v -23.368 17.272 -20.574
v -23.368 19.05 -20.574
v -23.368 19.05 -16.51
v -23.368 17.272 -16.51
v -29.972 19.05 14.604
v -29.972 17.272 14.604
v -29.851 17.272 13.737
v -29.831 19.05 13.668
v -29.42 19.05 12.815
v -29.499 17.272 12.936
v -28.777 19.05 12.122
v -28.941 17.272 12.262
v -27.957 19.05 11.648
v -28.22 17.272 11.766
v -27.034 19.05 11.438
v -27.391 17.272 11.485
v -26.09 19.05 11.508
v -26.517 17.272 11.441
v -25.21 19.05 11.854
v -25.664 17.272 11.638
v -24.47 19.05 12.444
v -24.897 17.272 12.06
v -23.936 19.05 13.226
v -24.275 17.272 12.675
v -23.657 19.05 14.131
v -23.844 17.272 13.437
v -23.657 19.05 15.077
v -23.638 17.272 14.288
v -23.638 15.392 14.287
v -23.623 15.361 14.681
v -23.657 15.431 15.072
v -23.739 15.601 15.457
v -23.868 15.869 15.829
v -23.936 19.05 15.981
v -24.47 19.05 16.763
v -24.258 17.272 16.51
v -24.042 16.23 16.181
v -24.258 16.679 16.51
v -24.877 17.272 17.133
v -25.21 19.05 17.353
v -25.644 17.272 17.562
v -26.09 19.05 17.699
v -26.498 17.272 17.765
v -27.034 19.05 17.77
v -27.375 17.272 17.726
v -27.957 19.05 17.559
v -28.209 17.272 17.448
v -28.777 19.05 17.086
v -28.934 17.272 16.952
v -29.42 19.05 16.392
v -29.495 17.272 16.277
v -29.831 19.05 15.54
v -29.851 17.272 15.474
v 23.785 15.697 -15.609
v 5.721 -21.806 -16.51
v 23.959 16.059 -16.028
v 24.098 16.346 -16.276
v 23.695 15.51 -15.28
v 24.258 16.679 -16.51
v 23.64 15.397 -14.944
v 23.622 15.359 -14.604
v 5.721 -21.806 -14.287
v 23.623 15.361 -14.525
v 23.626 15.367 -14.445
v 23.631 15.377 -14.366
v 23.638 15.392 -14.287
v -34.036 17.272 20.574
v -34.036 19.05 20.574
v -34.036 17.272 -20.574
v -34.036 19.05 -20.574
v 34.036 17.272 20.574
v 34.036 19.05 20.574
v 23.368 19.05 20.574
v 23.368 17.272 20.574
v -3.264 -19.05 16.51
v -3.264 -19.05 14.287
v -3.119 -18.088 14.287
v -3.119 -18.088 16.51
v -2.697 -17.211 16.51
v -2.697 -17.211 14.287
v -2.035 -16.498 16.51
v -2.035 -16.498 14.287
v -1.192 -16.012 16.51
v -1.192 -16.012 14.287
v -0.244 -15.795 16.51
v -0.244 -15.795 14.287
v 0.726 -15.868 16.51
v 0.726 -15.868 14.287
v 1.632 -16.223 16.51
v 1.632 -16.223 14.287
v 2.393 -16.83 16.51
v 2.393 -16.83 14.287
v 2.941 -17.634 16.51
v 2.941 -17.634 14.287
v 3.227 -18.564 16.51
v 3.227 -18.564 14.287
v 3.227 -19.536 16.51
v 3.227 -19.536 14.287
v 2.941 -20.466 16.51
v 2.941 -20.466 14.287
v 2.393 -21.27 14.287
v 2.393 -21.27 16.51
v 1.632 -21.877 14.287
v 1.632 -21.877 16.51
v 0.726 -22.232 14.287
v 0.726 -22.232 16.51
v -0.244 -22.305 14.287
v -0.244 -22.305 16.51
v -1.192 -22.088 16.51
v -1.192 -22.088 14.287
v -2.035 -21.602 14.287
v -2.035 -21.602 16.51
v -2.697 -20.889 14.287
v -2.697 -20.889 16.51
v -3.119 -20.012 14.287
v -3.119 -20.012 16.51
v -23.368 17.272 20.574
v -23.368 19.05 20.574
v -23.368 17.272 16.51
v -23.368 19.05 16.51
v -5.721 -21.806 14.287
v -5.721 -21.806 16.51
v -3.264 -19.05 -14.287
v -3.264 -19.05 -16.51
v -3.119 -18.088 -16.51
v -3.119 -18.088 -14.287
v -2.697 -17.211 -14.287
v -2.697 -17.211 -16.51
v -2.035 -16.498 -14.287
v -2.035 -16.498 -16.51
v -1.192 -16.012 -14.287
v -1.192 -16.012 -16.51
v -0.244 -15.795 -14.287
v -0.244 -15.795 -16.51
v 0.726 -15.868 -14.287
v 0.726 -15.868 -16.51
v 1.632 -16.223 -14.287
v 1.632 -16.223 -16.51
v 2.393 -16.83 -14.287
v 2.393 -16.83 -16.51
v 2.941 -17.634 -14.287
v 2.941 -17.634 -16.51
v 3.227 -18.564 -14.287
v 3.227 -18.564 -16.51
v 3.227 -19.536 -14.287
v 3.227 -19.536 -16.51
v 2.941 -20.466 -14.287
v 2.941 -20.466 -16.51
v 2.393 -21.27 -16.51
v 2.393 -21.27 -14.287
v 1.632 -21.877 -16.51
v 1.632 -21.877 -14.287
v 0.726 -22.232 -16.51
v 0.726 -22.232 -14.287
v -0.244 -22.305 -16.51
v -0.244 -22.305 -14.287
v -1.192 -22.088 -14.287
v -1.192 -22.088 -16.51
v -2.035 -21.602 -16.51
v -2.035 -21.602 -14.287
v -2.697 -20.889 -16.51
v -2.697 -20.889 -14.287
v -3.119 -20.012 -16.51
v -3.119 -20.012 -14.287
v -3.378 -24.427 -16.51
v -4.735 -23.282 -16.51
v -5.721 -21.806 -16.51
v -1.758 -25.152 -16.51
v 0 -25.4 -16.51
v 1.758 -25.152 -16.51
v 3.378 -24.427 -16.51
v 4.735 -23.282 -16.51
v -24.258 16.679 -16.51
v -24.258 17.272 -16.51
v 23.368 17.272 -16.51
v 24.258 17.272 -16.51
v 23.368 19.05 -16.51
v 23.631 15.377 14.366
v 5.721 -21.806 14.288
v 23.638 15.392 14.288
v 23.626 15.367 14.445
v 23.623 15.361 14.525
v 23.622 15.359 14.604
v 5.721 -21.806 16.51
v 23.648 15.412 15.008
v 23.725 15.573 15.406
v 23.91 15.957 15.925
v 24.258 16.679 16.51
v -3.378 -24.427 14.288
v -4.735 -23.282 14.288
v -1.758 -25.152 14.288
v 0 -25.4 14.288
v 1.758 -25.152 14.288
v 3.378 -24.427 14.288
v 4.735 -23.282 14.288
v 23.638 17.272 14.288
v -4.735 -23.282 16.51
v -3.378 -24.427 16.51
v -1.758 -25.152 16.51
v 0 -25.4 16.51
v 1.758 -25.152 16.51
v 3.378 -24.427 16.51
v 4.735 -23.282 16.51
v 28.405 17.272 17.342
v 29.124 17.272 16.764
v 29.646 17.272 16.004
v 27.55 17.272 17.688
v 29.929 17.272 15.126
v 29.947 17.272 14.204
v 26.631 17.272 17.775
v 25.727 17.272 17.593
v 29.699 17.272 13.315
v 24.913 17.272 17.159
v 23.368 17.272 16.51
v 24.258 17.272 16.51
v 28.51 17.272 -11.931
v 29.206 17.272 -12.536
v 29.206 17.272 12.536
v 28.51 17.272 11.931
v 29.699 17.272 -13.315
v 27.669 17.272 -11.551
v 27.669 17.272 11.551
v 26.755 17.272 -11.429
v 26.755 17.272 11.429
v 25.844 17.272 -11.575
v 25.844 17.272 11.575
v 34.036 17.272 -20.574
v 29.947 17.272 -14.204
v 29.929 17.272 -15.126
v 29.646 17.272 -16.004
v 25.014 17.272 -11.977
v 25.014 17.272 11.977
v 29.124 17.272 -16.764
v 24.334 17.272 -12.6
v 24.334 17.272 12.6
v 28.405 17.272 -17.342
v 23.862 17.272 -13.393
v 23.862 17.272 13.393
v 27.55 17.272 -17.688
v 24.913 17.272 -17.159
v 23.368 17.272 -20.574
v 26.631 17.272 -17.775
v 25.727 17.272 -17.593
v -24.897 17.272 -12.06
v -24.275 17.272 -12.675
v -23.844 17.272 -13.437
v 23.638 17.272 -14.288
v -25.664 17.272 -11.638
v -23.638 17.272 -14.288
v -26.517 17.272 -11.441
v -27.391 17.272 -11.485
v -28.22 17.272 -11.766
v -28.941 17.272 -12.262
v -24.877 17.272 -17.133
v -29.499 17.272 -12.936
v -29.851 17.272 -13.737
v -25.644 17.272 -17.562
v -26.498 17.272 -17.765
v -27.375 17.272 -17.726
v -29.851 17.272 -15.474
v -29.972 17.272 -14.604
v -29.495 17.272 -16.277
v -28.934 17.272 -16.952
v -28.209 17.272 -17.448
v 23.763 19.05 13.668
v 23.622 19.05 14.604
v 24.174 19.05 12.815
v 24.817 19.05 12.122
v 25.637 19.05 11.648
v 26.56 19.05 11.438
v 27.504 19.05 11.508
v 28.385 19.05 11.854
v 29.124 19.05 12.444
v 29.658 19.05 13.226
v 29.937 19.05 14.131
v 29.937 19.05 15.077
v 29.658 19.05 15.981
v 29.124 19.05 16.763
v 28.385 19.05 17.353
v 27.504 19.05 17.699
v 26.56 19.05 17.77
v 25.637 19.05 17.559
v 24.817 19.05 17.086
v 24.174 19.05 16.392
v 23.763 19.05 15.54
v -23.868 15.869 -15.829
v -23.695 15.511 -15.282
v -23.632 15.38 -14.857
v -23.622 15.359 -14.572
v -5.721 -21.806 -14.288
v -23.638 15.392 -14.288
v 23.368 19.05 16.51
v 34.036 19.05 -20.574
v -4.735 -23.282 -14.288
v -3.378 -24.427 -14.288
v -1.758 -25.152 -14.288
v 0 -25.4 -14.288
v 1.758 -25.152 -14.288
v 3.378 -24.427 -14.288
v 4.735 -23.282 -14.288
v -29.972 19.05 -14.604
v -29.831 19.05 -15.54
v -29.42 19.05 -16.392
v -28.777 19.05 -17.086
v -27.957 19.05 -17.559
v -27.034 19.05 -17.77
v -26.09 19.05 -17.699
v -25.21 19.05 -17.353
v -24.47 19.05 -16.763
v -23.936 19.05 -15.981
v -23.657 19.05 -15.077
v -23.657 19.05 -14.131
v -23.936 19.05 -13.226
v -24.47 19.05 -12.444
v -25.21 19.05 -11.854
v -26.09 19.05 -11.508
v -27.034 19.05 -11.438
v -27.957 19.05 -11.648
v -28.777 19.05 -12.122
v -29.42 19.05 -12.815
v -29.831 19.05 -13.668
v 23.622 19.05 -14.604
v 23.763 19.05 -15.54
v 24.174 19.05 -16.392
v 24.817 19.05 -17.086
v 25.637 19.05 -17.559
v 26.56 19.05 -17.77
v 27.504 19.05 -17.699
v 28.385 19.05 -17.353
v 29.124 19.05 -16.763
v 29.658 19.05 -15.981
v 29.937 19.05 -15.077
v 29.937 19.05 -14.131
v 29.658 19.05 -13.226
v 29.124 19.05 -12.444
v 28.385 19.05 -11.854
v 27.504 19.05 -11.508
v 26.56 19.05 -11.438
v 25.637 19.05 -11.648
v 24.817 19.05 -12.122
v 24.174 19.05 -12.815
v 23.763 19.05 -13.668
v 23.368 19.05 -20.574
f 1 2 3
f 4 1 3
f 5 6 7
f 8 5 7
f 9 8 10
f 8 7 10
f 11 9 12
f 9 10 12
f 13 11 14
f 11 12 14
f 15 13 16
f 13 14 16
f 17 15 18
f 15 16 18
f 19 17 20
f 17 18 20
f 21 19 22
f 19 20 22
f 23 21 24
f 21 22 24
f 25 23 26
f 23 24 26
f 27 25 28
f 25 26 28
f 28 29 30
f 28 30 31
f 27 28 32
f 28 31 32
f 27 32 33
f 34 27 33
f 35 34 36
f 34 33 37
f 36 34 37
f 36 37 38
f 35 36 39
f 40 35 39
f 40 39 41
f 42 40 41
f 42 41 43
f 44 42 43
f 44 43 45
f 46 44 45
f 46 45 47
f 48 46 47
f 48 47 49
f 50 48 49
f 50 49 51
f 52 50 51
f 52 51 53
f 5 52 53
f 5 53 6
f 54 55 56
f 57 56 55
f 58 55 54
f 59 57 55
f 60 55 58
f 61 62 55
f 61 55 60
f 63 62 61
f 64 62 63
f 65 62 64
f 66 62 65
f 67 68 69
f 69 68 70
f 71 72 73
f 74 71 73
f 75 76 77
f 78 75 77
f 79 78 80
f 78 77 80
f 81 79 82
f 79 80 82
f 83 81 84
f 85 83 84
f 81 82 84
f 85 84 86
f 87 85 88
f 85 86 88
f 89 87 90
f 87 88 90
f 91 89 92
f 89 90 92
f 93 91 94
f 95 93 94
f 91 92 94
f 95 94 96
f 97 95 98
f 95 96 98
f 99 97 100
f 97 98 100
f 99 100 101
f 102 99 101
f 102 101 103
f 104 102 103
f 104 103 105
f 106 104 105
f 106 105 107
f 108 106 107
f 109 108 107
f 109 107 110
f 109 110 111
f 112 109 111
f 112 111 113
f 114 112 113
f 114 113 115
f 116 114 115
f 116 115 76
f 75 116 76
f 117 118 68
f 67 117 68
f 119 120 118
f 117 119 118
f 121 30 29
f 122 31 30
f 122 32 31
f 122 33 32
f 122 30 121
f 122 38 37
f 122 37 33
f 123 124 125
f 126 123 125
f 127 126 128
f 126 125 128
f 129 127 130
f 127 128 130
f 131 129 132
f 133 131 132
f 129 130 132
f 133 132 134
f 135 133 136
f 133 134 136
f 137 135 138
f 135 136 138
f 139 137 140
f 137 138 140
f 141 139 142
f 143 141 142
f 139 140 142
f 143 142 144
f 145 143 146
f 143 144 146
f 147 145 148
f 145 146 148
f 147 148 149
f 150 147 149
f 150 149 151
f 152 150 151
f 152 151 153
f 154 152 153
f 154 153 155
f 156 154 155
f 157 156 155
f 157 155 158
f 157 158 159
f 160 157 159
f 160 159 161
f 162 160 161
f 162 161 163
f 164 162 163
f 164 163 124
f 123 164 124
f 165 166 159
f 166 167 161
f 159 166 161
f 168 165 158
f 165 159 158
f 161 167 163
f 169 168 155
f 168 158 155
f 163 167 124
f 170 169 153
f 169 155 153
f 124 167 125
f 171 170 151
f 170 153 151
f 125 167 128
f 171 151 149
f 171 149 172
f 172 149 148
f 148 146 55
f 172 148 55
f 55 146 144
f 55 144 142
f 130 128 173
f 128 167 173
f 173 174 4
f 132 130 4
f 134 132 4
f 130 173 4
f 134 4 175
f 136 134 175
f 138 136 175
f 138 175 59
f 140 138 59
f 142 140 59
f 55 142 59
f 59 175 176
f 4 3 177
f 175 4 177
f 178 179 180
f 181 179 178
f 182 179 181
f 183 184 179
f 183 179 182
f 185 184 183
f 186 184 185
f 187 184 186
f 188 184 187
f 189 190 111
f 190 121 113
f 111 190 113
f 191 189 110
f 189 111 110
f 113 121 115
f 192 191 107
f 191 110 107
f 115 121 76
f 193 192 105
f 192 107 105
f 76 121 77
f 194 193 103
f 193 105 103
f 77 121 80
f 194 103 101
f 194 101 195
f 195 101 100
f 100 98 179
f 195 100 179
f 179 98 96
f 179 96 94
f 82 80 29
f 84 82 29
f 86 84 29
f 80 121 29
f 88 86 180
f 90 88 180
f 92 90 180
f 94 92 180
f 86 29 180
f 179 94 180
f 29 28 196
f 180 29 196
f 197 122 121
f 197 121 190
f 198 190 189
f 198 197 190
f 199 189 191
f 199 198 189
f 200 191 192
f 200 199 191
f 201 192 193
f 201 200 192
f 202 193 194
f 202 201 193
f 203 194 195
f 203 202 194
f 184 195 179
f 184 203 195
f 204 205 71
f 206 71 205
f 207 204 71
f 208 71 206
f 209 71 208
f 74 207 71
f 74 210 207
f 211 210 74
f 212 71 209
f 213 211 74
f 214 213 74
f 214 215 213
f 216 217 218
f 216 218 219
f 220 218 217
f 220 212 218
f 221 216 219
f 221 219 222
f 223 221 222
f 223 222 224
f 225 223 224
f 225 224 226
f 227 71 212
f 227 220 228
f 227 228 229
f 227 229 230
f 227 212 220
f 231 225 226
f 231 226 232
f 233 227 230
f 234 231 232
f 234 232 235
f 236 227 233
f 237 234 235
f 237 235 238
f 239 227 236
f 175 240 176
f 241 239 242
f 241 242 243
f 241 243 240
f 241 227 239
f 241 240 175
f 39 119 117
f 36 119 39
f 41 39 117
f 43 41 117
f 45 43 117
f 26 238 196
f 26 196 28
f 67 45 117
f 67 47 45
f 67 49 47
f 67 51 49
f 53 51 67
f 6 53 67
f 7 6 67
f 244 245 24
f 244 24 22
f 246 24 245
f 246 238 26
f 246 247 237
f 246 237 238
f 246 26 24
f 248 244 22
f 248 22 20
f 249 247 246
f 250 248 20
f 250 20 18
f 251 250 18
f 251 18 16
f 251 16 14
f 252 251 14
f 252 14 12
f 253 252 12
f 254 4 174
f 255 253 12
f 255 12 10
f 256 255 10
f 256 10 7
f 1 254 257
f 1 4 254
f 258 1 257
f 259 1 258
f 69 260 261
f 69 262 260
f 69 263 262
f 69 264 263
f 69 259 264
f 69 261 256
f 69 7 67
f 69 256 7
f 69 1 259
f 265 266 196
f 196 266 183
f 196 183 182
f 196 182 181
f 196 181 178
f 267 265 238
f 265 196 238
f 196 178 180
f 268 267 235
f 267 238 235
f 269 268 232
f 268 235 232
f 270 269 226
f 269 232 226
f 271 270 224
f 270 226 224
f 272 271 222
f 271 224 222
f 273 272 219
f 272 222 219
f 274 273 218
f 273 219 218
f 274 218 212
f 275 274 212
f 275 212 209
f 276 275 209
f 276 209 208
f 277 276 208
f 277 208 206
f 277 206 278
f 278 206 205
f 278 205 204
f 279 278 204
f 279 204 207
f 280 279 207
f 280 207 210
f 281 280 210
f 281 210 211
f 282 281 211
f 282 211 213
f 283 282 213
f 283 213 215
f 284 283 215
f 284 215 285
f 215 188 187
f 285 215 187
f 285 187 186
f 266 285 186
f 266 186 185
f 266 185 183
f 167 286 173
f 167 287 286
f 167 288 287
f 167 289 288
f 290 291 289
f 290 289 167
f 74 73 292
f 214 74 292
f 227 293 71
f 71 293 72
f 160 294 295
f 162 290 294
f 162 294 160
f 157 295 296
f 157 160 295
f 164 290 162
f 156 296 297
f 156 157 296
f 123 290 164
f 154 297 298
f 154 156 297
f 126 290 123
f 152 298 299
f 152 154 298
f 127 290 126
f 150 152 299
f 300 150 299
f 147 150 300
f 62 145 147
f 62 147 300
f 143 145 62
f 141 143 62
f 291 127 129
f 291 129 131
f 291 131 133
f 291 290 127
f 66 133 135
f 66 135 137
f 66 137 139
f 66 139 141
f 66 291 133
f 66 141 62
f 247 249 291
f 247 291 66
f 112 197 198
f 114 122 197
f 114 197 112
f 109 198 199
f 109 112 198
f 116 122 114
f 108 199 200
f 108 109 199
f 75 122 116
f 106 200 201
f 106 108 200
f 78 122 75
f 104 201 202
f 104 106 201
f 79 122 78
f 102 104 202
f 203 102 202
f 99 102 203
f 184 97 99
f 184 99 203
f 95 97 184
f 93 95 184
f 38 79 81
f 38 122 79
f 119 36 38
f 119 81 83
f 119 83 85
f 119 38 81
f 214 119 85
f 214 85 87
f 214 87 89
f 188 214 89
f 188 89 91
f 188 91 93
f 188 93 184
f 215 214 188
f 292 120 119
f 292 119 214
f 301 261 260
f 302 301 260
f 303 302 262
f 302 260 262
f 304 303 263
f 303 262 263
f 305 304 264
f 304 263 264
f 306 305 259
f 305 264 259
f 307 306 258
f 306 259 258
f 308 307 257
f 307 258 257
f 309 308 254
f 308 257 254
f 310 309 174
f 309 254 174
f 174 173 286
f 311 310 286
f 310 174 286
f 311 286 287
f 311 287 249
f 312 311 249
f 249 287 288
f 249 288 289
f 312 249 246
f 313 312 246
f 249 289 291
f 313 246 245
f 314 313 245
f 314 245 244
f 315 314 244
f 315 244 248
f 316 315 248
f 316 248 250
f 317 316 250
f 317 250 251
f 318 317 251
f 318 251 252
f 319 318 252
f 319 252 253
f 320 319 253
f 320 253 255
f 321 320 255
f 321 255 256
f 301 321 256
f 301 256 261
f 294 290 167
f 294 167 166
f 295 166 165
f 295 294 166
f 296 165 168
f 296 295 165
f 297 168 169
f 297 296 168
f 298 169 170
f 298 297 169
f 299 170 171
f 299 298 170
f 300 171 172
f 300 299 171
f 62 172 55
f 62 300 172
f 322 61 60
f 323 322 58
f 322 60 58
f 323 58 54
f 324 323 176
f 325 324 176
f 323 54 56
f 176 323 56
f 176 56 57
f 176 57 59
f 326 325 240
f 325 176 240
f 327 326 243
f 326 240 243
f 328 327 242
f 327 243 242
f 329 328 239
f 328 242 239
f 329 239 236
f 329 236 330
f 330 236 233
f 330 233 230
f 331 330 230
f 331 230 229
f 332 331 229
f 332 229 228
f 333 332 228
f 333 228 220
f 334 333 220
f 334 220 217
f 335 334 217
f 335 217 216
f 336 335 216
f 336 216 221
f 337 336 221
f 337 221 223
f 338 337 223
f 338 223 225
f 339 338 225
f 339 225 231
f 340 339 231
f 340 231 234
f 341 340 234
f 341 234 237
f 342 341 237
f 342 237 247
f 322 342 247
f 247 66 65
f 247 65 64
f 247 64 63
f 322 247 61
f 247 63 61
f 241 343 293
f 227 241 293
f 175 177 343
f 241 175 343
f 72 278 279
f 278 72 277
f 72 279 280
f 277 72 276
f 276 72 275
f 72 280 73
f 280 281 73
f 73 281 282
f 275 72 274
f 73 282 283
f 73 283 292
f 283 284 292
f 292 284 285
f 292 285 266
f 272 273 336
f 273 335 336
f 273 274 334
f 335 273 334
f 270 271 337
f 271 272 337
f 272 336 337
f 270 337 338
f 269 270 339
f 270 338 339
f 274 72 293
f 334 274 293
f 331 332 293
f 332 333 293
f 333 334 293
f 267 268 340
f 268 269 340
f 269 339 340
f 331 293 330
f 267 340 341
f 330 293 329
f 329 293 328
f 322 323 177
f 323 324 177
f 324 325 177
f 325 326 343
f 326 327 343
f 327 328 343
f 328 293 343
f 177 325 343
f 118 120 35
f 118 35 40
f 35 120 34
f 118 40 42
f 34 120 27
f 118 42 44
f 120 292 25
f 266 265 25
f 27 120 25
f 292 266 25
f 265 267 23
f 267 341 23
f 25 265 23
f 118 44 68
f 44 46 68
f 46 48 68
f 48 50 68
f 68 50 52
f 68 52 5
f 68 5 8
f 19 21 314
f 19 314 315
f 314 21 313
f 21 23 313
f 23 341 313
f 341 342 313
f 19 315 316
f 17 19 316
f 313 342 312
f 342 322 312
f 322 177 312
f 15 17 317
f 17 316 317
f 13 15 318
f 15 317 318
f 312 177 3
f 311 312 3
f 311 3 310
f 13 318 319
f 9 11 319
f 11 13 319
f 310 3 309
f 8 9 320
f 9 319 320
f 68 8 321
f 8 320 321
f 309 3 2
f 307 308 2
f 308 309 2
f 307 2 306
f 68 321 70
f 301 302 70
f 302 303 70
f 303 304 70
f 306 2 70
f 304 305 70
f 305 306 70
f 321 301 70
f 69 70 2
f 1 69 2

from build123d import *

# Parameters (mm, degrees)
BOSS_EXTRUDE1_DEPTH         = 16.51
BOSS_EXTRUDE2_DEPTH         = 1.778
F_1_4_0_25_DIAMETER_HOLE1_D = 6.35
SKETCH6_W                   = 53.975
SKETCH6_H                   = 44.45
CUT_EXTRUDE1_DEPTH          = 14.2875
F_0_257_DIAMETER_HOLE1_D    = 6.5278


with BuildPart() as part:
    # Sketch1 → Boss-Extrude1 (new, symmetric)
    with BuildSketch(Plane.XY):
        with BuildLine():
            Line((25.4, 19.05), (-25.4, 19.05))
            Line((-25.4, 19.05), (-5.720931214, -21.805620809))
            ThreePointArc((-5.720931214, -21.805620809), (0, -25.4), (5.720931214, -21.805620809))
            Line((5.720931214, -21.805620809), (25.4, 19.05))
        make_face()
    extrude(amount=BOSS_EXTRUDE1_DEPTH, both=True)

    # Sketch2 → Boss-Extrude2 (add)
    with BuildSketch(Plane(origin=(0, 19.05, 0), x_dir=(1, 0, 0), z_dir=(0, 1, 0))):
        Polygon((-34.036, -20.574), (-34.036, 20.574), (-23.368, 20.574), (-23.368, 16.51), (23.368, 16.51), (23.368, 20.574), (34.036, 20.574), (34.036, -20.574), (23.368, -20.574), (23.368, -16.51), (-23.368, -16.51), (-23.368, -20.574), align=None)
    extrude(amount=-BOSS_EXTRUDE2_DEPTH)

    # 1/4 (0.25) Diameter Hole1 (through all)
    with Locations(Plane(origin=(0, 19.05, 0), x_dir=(1, 0, 0), z_dir=(0, 1, 0))):
        with Locations((-26.797, 14.603831543), (-26.797, -14.603831543), (26.797, -14.603831543), (26.797, 14.603831543)):
            Hole(F_1_4_0_25_DIAMETER_HOLE1_D / 2)

    # Sketch6 → Cut-Extrude1 (cut, symmetric)
    with BuildSketch(Plane.XY):
        with Locations((0, -4.953)):
            Rectangle(SKETCH6_W, SKETCH6_H)
    extrude(amount=CUT_EXTRUDE1_DEPTH, both=True, mode=Mode.SUBTRACT)

    # F (0.257) Diameter Hole1 (through all)
    with Locations(Plane.XY.offset(16.51)):
        with Locations((0, -19.05)):
            Hole(F_0_257_DIAMETER_HOLE1_D / 2)


solid = part.part
